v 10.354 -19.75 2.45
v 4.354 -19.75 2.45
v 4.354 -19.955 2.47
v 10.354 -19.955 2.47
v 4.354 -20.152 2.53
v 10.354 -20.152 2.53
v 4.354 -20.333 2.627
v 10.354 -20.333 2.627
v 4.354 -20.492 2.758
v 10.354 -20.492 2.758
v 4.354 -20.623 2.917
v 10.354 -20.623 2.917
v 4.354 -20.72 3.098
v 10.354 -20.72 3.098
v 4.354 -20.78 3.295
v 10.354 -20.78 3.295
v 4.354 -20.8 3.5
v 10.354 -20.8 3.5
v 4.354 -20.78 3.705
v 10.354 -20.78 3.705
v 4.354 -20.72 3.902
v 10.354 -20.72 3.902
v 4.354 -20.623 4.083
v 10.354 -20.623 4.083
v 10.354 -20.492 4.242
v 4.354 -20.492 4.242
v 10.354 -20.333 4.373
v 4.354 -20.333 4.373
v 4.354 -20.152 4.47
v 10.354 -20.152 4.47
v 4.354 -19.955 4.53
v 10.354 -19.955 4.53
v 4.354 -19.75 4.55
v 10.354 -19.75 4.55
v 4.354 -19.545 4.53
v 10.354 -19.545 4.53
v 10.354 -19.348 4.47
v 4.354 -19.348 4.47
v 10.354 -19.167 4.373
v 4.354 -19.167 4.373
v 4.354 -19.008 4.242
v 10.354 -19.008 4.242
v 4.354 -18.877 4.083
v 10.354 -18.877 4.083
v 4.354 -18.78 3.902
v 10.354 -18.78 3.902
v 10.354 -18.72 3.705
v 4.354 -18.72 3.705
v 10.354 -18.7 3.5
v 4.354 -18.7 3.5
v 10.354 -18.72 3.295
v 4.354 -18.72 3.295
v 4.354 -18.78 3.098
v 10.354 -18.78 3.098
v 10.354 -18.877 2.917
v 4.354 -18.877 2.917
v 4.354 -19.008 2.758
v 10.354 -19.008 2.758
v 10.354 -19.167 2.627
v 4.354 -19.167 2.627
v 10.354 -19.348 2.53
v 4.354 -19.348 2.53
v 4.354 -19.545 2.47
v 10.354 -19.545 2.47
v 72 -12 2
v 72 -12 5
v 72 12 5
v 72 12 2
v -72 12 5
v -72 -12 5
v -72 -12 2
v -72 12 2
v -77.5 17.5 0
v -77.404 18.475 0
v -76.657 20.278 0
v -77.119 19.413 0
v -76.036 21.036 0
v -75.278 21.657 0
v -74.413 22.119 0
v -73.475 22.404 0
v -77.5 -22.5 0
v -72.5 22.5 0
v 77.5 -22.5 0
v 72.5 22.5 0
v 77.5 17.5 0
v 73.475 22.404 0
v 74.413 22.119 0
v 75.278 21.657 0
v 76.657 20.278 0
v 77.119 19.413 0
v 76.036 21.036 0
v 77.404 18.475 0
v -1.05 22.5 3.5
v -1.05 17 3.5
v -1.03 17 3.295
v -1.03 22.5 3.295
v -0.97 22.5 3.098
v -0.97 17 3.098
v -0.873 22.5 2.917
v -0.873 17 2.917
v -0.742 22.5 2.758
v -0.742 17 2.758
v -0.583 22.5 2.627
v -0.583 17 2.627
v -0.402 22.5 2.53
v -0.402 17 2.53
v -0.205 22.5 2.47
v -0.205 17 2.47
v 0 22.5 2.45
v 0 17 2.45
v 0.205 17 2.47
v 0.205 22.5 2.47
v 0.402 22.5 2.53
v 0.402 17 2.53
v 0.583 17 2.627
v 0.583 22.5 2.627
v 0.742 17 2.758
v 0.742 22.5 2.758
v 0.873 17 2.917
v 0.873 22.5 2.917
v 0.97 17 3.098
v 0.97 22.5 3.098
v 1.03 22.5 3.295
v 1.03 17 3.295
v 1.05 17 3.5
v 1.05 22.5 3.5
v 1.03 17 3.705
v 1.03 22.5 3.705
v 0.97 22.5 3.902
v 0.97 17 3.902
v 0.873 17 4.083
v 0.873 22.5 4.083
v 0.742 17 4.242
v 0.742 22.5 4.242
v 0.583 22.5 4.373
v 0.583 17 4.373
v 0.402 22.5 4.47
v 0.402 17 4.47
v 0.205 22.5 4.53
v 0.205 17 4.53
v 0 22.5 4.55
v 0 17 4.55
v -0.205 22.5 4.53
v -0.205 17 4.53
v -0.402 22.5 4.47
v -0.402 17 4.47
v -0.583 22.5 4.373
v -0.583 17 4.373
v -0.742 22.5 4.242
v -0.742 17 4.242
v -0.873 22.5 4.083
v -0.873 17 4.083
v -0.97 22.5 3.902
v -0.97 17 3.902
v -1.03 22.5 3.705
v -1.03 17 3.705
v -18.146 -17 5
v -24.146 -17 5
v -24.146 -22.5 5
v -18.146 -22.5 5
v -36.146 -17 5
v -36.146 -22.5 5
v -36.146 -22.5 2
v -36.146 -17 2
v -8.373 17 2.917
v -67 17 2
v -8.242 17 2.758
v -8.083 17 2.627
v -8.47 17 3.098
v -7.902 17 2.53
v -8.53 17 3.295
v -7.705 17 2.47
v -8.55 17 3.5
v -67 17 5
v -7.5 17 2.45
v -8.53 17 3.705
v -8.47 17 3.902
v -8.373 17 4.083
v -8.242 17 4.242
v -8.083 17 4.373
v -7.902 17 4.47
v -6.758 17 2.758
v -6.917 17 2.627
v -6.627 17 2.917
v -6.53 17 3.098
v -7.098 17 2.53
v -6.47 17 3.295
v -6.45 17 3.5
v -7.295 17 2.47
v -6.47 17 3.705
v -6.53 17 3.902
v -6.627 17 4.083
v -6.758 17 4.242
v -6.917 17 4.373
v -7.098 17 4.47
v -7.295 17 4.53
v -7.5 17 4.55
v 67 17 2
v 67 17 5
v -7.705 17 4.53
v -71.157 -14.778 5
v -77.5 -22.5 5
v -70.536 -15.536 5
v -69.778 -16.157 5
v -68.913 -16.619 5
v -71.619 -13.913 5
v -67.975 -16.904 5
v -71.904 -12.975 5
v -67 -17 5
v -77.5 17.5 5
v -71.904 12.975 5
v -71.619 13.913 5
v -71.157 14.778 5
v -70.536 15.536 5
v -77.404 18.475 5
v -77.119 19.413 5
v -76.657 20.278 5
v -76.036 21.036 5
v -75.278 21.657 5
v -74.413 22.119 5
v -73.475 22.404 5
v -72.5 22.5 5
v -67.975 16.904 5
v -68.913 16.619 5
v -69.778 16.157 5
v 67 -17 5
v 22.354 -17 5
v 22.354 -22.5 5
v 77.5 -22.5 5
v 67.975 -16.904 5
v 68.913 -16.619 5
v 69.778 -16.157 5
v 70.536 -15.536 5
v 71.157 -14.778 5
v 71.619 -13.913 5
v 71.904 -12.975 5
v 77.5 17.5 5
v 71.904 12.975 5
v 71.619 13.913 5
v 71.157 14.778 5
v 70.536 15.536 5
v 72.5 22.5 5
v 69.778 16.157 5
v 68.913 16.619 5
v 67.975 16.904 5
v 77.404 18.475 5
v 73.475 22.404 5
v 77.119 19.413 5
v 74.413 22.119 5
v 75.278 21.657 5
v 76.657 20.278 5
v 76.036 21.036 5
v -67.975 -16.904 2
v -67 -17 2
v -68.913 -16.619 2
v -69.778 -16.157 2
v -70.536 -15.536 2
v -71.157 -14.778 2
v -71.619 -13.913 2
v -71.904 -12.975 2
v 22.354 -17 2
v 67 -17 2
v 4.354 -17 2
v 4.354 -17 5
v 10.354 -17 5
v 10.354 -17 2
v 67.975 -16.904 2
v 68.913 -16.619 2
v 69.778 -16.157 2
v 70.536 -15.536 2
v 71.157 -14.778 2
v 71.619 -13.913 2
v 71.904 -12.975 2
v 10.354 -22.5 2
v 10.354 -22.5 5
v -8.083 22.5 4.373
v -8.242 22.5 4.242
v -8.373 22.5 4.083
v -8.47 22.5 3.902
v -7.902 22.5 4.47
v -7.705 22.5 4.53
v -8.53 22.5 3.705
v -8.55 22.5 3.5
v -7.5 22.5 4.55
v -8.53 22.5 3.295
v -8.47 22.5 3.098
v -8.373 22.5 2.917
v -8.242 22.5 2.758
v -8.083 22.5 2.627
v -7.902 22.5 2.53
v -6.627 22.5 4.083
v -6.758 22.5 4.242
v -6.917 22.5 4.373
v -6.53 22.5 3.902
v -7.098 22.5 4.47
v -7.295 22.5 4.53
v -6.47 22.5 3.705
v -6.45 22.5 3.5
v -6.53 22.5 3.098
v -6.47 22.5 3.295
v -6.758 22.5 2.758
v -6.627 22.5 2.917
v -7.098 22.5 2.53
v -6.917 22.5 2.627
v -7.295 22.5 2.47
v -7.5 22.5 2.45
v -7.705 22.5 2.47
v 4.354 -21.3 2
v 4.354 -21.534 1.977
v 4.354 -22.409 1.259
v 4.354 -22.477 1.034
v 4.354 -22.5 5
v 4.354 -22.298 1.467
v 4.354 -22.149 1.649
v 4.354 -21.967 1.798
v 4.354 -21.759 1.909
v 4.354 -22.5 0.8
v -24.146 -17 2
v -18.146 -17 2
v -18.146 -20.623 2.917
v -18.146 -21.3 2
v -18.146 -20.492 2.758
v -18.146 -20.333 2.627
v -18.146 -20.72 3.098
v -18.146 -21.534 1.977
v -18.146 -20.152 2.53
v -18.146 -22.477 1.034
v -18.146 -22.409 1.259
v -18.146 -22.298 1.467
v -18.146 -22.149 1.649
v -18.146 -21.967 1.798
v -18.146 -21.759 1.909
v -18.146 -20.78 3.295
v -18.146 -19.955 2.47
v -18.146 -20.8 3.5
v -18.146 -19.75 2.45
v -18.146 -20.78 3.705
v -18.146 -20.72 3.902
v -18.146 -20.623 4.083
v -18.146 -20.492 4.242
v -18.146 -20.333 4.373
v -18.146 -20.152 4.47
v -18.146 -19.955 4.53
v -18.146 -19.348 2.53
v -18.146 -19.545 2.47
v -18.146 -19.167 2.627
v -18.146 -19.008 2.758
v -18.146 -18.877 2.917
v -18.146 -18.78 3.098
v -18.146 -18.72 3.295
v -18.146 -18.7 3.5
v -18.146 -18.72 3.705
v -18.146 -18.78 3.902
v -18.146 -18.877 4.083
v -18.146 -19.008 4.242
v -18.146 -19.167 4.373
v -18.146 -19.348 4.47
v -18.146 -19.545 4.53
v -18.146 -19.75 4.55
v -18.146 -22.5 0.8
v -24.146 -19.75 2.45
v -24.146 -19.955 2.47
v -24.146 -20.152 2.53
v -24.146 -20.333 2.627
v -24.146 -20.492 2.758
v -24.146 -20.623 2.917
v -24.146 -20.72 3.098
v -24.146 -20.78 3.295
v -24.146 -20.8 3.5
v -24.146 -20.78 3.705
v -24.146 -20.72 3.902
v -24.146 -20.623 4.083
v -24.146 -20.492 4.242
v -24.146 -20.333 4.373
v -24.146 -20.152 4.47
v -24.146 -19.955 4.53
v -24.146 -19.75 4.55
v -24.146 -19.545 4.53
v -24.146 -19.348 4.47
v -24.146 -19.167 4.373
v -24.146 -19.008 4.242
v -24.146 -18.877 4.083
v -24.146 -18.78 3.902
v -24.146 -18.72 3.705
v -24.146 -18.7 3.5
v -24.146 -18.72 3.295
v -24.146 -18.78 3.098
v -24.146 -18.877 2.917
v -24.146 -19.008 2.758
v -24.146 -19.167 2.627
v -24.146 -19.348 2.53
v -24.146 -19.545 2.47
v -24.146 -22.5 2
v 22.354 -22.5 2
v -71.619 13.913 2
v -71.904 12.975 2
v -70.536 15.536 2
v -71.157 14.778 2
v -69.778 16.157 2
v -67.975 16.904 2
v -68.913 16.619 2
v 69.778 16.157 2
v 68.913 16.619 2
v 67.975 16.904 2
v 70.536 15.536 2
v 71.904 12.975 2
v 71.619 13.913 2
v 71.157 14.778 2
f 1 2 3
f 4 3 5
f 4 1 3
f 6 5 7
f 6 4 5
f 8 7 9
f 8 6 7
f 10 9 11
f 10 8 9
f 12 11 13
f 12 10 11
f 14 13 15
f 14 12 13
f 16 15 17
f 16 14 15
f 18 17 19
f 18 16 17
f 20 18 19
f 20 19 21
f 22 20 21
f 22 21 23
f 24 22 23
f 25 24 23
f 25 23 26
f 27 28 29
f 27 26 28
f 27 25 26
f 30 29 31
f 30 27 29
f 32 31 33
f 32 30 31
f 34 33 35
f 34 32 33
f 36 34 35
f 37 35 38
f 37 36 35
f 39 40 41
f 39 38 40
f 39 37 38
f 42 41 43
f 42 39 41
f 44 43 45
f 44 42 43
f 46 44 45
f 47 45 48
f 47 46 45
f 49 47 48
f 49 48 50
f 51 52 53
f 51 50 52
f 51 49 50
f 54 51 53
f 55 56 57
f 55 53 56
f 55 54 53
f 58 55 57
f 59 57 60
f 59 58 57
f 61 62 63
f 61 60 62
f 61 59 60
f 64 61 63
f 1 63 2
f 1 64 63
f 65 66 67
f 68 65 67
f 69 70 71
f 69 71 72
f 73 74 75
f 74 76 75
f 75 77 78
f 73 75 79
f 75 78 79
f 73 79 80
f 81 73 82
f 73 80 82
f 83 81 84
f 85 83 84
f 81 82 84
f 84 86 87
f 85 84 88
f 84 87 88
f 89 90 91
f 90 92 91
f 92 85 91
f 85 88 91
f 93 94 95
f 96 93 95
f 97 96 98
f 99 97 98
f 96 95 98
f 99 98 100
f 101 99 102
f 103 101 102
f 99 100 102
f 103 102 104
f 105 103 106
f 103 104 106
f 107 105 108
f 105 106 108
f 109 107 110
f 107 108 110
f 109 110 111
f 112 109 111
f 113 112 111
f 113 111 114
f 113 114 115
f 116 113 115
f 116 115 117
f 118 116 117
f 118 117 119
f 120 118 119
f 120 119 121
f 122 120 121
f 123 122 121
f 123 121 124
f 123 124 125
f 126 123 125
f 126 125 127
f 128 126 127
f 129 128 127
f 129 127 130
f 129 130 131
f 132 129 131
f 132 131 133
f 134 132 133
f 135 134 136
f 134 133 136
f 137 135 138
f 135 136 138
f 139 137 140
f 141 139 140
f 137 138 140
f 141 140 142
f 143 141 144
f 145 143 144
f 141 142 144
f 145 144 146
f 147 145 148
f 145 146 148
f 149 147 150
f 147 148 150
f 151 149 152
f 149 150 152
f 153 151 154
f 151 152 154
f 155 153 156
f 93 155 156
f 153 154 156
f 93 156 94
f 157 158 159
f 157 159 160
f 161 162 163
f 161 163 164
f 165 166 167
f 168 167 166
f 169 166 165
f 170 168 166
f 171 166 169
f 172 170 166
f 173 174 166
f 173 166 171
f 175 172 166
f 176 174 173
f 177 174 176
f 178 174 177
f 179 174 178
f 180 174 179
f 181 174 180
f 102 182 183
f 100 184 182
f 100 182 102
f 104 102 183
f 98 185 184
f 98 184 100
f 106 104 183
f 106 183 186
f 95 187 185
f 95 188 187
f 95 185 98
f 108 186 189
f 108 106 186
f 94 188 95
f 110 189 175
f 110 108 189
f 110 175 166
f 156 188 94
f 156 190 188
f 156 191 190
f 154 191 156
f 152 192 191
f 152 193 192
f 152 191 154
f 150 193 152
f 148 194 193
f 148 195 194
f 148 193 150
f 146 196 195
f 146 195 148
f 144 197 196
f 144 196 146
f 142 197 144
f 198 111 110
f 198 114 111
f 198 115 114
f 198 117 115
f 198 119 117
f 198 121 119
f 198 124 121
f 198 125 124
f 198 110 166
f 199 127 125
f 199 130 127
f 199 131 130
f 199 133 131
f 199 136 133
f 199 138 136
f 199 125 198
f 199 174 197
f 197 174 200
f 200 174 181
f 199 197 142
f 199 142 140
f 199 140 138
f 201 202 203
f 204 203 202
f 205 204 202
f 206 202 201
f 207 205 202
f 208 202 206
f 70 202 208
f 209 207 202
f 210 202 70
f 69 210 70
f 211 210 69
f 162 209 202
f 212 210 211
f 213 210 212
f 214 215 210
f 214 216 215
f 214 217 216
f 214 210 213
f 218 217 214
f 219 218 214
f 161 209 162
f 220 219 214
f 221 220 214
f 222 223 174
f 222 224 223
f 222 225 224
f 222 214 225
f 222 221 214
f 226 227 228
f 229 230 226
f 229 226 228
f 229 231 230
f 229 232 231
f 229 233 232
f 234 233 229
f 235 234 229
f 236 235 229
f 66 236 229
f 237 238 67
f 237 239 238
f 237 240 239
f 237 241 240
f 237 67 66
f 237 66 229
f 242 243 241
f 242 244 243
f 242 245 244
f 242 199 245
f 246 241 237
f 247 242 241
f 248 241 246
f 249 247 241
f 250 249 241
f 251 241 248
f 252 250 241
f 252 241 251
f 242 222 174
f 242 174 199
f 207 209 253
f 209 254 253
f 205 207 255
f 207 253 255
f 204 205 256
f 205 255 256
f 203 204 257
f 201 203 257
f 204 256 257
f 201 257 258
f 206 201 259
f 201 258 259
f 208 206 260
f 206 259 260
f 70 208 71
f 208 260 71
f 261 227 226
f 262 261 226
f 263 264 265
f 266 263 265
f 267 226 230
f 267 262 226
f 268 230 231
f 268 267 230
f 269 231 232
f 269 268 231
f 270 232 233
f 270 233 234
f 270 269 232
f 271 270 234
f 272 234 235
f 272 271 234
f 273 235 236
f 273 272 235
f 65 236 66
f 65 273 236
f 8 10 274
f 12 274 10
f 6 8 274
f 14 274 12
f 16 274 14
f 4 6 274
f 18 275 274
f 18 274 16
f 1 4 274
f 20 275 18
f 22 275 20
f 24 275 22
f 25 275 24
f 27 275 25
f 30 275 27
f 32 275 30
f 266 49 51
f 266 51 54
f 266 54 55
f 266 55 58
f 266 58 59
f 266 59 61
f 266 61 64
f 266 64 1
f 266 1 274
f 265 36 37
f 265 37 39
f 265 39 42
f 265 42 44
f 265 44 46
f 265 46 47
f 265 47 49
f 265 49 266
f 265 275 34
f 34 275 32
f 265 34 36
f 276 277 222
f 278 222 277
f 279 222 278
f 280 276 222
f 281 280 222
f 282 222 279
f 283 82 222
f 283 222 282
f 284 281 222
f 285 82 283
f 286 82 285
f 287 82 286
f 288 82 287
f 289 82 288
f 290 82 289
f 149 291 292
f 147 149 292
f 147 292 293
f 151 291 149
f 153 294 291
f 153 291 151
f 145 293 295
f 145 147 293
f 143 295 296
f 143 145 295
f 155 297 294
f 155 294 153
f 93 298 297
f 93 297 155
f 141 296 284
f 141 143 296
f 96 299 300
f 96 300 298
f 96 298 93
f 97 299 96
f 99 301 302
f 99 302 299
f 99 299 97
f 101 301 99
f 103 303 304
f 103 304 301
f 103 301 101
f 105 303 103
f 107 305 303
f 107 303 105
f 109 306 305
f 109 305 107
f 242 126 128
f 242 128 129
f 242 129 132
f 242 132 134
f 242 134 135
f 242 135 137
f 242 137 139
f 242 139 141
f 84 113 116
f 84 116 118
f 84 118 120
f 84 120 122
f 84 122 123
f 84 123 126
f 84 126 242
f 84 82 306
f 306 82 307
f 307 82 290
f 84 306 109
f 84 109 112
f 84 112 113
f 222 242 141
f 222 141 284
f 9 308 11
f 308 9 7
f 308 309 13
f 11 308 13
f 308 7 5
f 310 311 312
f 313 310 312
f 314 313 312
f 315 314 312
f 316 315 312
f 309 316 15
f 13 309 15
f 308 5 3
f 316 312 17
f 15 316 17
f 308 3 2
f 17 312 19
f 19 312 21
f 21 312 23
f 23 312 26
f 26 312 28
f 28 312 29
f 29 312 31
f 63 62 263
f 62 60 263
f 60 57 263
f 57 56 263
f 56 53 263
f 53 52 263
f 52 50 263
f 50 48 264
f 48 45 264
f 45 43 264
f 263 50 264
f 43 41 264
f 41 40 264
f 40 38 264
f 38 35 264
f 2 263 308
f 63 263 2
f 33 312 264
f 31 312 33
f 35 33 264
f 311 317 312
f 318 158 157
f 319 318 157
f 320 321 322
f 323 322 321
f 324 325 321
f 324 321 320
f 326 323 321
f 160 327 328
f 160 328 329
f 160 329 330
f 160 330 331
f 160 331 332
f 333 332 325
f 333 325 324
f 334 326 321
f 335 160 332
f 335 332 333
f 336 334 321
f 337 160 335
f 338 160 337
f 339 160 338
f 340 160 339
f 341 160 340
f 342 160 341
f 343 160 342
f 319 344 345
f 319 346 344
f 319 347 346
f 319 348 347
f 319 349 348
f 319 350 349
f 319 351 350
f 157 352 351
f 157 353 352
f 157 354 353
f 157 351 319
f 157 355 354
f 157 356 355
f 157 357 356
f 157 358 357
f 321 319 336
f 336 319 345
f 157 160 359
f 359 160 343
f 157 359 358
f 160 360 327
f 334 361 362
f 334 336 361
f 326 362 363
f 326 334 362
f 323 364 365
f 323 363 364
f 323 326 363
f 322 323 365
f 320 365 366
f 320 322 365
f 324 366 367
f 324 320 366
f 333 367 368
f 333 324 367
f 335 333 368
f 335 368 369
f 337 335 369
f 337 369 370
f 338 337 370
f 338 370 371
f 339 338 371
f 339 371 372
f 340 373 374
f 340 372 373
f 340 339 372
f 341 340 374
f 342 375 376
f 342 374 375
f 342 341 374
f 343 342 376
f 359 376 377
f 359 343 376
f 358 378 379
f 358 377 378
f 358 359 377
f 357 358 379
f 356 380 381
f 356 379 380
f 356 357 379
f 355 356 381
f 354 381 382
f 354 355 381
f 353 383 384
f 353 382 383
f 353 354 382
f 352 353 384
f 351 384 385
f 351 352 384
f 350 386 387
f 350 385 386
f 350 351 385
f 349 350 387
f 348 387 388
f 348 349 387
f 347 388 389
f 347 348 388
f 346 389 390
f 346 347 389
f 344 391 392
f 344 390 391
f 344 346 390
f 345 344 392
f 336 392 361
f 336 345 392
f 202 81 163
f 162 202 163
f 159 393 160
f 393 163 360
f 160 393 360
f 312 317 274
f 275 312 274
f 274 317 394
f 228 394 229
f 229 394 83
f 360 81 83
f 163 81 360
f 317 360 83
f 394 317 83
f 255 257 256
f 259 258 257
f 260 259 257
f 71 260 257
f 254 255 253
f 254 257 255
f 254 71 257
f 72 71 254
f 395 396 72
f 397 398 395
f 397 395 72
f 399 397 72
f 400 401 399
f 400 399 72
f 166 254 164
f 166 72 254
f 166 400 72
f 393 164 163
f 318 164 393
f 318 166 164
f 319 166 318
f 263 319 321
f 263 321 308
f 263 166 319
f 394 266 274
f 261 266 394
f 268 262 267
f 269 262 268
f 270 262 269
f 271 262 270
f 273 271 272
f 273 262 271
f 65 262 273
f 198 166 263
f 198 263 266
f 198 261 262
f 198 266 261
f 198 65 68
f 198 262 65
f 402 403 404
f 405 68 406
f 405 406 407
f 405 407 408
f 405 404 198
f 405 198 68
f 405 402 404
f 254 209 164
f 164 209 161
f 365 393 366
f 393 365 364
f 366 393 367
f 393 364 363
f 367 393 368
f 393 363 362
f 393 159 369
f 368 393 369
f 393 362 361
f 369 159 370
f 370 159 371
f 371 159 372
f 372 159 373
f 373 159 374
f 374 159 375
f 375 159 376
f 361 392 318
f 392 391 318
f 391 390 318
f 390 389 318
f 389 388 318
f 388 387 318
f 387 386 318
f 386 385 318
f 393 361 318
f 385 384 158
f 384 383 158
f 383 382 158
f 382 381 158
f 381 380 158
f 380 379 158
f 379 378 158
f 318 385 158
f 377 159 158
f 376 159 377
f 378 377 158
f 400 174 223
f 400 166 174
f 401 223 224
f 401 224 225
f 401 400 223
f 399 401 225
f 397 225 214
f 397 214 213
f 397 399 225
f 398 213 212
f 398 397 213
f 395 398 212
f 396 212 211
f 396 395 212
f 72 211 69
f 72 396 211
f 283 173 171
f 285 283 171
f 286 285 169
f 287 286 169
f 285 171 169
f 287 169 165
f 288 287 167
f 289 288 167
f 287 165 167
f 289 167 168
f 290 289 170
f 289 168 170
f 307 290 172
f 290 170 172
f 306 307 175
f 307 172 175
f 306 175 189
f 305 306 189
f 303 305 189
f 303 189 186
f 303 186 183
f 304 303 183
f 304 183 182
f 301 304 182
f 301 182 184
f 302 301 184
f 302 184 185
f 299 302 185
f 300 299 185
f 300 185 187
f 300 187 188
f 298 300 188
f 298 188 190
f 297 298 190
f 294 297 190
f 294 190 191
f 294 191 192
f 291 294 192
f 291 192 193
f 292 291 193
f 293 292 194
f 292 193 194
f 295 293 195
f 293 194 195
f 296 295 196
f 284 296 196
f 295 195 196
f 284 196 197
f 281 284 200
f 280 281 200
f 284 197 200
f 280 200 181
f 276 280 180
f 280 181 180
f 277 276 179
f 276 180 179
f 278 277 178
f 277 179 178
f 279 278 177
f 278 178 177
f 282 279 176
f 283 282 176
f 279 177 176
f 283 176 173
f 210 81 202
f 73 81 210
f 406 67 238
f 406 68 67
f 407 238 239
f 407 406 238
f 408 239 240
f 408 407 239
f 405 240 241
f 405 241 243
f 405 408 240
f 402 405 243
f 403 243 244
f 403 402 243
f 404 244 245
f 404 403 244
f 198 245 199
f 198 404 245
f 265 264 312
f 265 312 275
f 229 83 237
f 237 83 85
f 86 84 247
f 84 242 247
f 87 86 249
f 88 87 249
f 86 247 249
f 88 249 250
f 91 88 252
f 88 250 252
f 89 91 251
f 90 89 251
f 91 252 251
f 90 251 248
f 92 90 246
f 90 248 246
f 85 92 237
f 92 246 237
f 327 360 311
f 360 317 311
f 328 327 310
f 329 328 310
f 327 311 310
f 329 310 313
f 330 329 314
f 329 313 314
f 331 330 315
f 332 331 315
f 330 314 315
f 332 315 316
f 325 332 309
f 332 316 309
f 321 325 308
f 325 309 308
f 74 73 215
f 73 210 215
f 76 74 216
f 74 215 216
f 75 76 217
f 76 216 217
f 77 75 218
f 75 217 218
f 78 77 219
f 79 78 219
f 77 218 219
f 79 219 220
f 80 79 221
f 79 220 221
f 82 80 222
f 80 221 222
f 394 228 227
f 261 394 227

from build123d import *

# Parameters (mm, degrees)
SKETCH_1_W                  = 155
SKETCH_1_H                  = 45
EXTRUDE_1_DEPTH             = 5
SKETCH_2_W                  = 144
SKETCH_2_H                  = 34
CUT_EXTRUDE_1_DEPTH         = 3
FILLET_1_R                  = 5
FILLET_2_R                  = 5
SKETCH_7_W                  = 22.5
SKETCH_7_H                  = 5.5
CUT_EXTRUDE_2_DEPTH         = 3
FILLET_7_R                  = 1.2
SKETCH_9_W                  = 12
SKETCH_9_H                  = 5.5
CUT_EXTRUDE_3_DEPTH         = 3
HOLE_WIZARD_2_1_2_1_2_D     = 2.1
HOLE_WIZARD_2_1_2_1_2_DEPTH = 13.2
HOLE_WIZARD_2_1_2_1_2_TIP   = 0.63090365
SKETCH_15_W                 = 12
SKETCH_15_H                 = 5.5
CUT_EXTRUDE_4_DEPTH         = 3


with BuildPart() as part:
    # 草图1 → 凸台-拉伸1 (new body)
    with BuildSketch(Plane.XY):
        Rectangle(SKETCH_1_W, SKETCH_1_H)
    extrude(amount=EXTRUDE_1_DEPTH)

    # 草图2 → 切除-拉伸1 (cut)
    with BuildSketch(Plane.XY.offset(5)):
        Rectangle(SKETCH_2_W, SKETCH_2_H)
    extrude(amount=-CUT_EXTRUDE_1_DEPTH, mode=Mode.SUBTRACT)

    # 圆角1
    fillet_1_edges = [part.edges().sort_by_distance(p)[0] for p in [
        (-77.5, 22.5, 2.5),
        (77.5, 22.5, 2.5),
    ]]
    fillet(fillet_1_edges, radius=FILLET_1_R)

    # 圆角2
    fillet_2_edges = [part.edges().sort_by_distance(p)[0] for p in [
        (-72, -17, 3.5),
        (-72, 17, 3.5),
        (72, 17, 3.5),
        (72, -17, 3.5),
    ]]
    fillet(fillet_2_edges, radius=FILLET_2_R)

    # 草图7 → 切除-拉伸2 (cut)
    with BuildSketch(Plane.XY.offset(5)):
        with Locations((-6.895727583, -19.75)):
            Rectangle(SKETCH_7_W, SKETCH_7_H)
    extrude(amount=-CUT_EXTRUDE_2_DEPTH, mode=Mode.SUBTRACT)

    # 圆角7
    fillet_7_edges = [part.edges().sort_by_distance(p)[0] for p in [
        (-6.895727583, -22.5, 2),
    ]]
    fillet(fillet_7_edges, radius=FILLET_7_R)

    # 草图9 → 切除-拉伸3 (cut)
    with BuildSketch(Plane.XY.offset(5)):
        with Locations((16.354272417, -19.75)):
            Rectangle(SKETCH_9_W, SKETCH_9_H)
    extrude(amount=-CUT_EXTRUDE_3_DEPTH, mode=Mode.SUBTRACT)

    # 草图11 → Ø2.1 (2.1) 直径孔1 (revolve, cut)
    with BuildSketch(Plane(origin=(10.354272417, -19.75, 3.5), x_dir=(0, 0, -1), z_dir=(0, 1, 0))):
        Polygon((0, 0), (0, 36.63090365), (1.05, 36), (1.05, 0), align=None)
    revolve(axis=Axis((16.704272417, -19.75, 3.5), (-1, 0, 0)), mode=Mode.SUBTRACT)

    # Ø2.1 (2.1) 直径孔2
    with Locations(Plane(origin=(0, 22.5, 0), x_dir=(1, 0, 0), z_dir=(0, 1, 0))):
        with Locations((0, -3.5), (-7.5, -3.5)):
            Hole(HOLE_WIZARD_2_1_2_1_2_D / 2, depth=HOLE_WIZARD_2_1_2_1_2_DEPTH)
            with Locations((0, 0, -(HOLE_WIZARD_2_1_2_1_2_DEPTH + HOLE_WIZARD_2_1_2_1_2_TIP / 2))):  # 118° drill point
                Cone(0, HOLE_WIZARD_2_1_2_1_2_D / 2, HOLE_WIZARD_2_1_2_1_2_TIP, mode=Mode.SUBTRACT)

    # 草图15 → 切除-拉伸4 (cut)
    with BuildSketch(Plane.XY.offset(5)):
        with Locations((-30.145727583, -19.75)):
            Rectangle(SKETCH_15_W, SKETCH_15_H)
    extrude(amount=-CUT_EXTRUDE_4_DEPTH, mode=Mode.SUBTRACT)


solid = part.part
